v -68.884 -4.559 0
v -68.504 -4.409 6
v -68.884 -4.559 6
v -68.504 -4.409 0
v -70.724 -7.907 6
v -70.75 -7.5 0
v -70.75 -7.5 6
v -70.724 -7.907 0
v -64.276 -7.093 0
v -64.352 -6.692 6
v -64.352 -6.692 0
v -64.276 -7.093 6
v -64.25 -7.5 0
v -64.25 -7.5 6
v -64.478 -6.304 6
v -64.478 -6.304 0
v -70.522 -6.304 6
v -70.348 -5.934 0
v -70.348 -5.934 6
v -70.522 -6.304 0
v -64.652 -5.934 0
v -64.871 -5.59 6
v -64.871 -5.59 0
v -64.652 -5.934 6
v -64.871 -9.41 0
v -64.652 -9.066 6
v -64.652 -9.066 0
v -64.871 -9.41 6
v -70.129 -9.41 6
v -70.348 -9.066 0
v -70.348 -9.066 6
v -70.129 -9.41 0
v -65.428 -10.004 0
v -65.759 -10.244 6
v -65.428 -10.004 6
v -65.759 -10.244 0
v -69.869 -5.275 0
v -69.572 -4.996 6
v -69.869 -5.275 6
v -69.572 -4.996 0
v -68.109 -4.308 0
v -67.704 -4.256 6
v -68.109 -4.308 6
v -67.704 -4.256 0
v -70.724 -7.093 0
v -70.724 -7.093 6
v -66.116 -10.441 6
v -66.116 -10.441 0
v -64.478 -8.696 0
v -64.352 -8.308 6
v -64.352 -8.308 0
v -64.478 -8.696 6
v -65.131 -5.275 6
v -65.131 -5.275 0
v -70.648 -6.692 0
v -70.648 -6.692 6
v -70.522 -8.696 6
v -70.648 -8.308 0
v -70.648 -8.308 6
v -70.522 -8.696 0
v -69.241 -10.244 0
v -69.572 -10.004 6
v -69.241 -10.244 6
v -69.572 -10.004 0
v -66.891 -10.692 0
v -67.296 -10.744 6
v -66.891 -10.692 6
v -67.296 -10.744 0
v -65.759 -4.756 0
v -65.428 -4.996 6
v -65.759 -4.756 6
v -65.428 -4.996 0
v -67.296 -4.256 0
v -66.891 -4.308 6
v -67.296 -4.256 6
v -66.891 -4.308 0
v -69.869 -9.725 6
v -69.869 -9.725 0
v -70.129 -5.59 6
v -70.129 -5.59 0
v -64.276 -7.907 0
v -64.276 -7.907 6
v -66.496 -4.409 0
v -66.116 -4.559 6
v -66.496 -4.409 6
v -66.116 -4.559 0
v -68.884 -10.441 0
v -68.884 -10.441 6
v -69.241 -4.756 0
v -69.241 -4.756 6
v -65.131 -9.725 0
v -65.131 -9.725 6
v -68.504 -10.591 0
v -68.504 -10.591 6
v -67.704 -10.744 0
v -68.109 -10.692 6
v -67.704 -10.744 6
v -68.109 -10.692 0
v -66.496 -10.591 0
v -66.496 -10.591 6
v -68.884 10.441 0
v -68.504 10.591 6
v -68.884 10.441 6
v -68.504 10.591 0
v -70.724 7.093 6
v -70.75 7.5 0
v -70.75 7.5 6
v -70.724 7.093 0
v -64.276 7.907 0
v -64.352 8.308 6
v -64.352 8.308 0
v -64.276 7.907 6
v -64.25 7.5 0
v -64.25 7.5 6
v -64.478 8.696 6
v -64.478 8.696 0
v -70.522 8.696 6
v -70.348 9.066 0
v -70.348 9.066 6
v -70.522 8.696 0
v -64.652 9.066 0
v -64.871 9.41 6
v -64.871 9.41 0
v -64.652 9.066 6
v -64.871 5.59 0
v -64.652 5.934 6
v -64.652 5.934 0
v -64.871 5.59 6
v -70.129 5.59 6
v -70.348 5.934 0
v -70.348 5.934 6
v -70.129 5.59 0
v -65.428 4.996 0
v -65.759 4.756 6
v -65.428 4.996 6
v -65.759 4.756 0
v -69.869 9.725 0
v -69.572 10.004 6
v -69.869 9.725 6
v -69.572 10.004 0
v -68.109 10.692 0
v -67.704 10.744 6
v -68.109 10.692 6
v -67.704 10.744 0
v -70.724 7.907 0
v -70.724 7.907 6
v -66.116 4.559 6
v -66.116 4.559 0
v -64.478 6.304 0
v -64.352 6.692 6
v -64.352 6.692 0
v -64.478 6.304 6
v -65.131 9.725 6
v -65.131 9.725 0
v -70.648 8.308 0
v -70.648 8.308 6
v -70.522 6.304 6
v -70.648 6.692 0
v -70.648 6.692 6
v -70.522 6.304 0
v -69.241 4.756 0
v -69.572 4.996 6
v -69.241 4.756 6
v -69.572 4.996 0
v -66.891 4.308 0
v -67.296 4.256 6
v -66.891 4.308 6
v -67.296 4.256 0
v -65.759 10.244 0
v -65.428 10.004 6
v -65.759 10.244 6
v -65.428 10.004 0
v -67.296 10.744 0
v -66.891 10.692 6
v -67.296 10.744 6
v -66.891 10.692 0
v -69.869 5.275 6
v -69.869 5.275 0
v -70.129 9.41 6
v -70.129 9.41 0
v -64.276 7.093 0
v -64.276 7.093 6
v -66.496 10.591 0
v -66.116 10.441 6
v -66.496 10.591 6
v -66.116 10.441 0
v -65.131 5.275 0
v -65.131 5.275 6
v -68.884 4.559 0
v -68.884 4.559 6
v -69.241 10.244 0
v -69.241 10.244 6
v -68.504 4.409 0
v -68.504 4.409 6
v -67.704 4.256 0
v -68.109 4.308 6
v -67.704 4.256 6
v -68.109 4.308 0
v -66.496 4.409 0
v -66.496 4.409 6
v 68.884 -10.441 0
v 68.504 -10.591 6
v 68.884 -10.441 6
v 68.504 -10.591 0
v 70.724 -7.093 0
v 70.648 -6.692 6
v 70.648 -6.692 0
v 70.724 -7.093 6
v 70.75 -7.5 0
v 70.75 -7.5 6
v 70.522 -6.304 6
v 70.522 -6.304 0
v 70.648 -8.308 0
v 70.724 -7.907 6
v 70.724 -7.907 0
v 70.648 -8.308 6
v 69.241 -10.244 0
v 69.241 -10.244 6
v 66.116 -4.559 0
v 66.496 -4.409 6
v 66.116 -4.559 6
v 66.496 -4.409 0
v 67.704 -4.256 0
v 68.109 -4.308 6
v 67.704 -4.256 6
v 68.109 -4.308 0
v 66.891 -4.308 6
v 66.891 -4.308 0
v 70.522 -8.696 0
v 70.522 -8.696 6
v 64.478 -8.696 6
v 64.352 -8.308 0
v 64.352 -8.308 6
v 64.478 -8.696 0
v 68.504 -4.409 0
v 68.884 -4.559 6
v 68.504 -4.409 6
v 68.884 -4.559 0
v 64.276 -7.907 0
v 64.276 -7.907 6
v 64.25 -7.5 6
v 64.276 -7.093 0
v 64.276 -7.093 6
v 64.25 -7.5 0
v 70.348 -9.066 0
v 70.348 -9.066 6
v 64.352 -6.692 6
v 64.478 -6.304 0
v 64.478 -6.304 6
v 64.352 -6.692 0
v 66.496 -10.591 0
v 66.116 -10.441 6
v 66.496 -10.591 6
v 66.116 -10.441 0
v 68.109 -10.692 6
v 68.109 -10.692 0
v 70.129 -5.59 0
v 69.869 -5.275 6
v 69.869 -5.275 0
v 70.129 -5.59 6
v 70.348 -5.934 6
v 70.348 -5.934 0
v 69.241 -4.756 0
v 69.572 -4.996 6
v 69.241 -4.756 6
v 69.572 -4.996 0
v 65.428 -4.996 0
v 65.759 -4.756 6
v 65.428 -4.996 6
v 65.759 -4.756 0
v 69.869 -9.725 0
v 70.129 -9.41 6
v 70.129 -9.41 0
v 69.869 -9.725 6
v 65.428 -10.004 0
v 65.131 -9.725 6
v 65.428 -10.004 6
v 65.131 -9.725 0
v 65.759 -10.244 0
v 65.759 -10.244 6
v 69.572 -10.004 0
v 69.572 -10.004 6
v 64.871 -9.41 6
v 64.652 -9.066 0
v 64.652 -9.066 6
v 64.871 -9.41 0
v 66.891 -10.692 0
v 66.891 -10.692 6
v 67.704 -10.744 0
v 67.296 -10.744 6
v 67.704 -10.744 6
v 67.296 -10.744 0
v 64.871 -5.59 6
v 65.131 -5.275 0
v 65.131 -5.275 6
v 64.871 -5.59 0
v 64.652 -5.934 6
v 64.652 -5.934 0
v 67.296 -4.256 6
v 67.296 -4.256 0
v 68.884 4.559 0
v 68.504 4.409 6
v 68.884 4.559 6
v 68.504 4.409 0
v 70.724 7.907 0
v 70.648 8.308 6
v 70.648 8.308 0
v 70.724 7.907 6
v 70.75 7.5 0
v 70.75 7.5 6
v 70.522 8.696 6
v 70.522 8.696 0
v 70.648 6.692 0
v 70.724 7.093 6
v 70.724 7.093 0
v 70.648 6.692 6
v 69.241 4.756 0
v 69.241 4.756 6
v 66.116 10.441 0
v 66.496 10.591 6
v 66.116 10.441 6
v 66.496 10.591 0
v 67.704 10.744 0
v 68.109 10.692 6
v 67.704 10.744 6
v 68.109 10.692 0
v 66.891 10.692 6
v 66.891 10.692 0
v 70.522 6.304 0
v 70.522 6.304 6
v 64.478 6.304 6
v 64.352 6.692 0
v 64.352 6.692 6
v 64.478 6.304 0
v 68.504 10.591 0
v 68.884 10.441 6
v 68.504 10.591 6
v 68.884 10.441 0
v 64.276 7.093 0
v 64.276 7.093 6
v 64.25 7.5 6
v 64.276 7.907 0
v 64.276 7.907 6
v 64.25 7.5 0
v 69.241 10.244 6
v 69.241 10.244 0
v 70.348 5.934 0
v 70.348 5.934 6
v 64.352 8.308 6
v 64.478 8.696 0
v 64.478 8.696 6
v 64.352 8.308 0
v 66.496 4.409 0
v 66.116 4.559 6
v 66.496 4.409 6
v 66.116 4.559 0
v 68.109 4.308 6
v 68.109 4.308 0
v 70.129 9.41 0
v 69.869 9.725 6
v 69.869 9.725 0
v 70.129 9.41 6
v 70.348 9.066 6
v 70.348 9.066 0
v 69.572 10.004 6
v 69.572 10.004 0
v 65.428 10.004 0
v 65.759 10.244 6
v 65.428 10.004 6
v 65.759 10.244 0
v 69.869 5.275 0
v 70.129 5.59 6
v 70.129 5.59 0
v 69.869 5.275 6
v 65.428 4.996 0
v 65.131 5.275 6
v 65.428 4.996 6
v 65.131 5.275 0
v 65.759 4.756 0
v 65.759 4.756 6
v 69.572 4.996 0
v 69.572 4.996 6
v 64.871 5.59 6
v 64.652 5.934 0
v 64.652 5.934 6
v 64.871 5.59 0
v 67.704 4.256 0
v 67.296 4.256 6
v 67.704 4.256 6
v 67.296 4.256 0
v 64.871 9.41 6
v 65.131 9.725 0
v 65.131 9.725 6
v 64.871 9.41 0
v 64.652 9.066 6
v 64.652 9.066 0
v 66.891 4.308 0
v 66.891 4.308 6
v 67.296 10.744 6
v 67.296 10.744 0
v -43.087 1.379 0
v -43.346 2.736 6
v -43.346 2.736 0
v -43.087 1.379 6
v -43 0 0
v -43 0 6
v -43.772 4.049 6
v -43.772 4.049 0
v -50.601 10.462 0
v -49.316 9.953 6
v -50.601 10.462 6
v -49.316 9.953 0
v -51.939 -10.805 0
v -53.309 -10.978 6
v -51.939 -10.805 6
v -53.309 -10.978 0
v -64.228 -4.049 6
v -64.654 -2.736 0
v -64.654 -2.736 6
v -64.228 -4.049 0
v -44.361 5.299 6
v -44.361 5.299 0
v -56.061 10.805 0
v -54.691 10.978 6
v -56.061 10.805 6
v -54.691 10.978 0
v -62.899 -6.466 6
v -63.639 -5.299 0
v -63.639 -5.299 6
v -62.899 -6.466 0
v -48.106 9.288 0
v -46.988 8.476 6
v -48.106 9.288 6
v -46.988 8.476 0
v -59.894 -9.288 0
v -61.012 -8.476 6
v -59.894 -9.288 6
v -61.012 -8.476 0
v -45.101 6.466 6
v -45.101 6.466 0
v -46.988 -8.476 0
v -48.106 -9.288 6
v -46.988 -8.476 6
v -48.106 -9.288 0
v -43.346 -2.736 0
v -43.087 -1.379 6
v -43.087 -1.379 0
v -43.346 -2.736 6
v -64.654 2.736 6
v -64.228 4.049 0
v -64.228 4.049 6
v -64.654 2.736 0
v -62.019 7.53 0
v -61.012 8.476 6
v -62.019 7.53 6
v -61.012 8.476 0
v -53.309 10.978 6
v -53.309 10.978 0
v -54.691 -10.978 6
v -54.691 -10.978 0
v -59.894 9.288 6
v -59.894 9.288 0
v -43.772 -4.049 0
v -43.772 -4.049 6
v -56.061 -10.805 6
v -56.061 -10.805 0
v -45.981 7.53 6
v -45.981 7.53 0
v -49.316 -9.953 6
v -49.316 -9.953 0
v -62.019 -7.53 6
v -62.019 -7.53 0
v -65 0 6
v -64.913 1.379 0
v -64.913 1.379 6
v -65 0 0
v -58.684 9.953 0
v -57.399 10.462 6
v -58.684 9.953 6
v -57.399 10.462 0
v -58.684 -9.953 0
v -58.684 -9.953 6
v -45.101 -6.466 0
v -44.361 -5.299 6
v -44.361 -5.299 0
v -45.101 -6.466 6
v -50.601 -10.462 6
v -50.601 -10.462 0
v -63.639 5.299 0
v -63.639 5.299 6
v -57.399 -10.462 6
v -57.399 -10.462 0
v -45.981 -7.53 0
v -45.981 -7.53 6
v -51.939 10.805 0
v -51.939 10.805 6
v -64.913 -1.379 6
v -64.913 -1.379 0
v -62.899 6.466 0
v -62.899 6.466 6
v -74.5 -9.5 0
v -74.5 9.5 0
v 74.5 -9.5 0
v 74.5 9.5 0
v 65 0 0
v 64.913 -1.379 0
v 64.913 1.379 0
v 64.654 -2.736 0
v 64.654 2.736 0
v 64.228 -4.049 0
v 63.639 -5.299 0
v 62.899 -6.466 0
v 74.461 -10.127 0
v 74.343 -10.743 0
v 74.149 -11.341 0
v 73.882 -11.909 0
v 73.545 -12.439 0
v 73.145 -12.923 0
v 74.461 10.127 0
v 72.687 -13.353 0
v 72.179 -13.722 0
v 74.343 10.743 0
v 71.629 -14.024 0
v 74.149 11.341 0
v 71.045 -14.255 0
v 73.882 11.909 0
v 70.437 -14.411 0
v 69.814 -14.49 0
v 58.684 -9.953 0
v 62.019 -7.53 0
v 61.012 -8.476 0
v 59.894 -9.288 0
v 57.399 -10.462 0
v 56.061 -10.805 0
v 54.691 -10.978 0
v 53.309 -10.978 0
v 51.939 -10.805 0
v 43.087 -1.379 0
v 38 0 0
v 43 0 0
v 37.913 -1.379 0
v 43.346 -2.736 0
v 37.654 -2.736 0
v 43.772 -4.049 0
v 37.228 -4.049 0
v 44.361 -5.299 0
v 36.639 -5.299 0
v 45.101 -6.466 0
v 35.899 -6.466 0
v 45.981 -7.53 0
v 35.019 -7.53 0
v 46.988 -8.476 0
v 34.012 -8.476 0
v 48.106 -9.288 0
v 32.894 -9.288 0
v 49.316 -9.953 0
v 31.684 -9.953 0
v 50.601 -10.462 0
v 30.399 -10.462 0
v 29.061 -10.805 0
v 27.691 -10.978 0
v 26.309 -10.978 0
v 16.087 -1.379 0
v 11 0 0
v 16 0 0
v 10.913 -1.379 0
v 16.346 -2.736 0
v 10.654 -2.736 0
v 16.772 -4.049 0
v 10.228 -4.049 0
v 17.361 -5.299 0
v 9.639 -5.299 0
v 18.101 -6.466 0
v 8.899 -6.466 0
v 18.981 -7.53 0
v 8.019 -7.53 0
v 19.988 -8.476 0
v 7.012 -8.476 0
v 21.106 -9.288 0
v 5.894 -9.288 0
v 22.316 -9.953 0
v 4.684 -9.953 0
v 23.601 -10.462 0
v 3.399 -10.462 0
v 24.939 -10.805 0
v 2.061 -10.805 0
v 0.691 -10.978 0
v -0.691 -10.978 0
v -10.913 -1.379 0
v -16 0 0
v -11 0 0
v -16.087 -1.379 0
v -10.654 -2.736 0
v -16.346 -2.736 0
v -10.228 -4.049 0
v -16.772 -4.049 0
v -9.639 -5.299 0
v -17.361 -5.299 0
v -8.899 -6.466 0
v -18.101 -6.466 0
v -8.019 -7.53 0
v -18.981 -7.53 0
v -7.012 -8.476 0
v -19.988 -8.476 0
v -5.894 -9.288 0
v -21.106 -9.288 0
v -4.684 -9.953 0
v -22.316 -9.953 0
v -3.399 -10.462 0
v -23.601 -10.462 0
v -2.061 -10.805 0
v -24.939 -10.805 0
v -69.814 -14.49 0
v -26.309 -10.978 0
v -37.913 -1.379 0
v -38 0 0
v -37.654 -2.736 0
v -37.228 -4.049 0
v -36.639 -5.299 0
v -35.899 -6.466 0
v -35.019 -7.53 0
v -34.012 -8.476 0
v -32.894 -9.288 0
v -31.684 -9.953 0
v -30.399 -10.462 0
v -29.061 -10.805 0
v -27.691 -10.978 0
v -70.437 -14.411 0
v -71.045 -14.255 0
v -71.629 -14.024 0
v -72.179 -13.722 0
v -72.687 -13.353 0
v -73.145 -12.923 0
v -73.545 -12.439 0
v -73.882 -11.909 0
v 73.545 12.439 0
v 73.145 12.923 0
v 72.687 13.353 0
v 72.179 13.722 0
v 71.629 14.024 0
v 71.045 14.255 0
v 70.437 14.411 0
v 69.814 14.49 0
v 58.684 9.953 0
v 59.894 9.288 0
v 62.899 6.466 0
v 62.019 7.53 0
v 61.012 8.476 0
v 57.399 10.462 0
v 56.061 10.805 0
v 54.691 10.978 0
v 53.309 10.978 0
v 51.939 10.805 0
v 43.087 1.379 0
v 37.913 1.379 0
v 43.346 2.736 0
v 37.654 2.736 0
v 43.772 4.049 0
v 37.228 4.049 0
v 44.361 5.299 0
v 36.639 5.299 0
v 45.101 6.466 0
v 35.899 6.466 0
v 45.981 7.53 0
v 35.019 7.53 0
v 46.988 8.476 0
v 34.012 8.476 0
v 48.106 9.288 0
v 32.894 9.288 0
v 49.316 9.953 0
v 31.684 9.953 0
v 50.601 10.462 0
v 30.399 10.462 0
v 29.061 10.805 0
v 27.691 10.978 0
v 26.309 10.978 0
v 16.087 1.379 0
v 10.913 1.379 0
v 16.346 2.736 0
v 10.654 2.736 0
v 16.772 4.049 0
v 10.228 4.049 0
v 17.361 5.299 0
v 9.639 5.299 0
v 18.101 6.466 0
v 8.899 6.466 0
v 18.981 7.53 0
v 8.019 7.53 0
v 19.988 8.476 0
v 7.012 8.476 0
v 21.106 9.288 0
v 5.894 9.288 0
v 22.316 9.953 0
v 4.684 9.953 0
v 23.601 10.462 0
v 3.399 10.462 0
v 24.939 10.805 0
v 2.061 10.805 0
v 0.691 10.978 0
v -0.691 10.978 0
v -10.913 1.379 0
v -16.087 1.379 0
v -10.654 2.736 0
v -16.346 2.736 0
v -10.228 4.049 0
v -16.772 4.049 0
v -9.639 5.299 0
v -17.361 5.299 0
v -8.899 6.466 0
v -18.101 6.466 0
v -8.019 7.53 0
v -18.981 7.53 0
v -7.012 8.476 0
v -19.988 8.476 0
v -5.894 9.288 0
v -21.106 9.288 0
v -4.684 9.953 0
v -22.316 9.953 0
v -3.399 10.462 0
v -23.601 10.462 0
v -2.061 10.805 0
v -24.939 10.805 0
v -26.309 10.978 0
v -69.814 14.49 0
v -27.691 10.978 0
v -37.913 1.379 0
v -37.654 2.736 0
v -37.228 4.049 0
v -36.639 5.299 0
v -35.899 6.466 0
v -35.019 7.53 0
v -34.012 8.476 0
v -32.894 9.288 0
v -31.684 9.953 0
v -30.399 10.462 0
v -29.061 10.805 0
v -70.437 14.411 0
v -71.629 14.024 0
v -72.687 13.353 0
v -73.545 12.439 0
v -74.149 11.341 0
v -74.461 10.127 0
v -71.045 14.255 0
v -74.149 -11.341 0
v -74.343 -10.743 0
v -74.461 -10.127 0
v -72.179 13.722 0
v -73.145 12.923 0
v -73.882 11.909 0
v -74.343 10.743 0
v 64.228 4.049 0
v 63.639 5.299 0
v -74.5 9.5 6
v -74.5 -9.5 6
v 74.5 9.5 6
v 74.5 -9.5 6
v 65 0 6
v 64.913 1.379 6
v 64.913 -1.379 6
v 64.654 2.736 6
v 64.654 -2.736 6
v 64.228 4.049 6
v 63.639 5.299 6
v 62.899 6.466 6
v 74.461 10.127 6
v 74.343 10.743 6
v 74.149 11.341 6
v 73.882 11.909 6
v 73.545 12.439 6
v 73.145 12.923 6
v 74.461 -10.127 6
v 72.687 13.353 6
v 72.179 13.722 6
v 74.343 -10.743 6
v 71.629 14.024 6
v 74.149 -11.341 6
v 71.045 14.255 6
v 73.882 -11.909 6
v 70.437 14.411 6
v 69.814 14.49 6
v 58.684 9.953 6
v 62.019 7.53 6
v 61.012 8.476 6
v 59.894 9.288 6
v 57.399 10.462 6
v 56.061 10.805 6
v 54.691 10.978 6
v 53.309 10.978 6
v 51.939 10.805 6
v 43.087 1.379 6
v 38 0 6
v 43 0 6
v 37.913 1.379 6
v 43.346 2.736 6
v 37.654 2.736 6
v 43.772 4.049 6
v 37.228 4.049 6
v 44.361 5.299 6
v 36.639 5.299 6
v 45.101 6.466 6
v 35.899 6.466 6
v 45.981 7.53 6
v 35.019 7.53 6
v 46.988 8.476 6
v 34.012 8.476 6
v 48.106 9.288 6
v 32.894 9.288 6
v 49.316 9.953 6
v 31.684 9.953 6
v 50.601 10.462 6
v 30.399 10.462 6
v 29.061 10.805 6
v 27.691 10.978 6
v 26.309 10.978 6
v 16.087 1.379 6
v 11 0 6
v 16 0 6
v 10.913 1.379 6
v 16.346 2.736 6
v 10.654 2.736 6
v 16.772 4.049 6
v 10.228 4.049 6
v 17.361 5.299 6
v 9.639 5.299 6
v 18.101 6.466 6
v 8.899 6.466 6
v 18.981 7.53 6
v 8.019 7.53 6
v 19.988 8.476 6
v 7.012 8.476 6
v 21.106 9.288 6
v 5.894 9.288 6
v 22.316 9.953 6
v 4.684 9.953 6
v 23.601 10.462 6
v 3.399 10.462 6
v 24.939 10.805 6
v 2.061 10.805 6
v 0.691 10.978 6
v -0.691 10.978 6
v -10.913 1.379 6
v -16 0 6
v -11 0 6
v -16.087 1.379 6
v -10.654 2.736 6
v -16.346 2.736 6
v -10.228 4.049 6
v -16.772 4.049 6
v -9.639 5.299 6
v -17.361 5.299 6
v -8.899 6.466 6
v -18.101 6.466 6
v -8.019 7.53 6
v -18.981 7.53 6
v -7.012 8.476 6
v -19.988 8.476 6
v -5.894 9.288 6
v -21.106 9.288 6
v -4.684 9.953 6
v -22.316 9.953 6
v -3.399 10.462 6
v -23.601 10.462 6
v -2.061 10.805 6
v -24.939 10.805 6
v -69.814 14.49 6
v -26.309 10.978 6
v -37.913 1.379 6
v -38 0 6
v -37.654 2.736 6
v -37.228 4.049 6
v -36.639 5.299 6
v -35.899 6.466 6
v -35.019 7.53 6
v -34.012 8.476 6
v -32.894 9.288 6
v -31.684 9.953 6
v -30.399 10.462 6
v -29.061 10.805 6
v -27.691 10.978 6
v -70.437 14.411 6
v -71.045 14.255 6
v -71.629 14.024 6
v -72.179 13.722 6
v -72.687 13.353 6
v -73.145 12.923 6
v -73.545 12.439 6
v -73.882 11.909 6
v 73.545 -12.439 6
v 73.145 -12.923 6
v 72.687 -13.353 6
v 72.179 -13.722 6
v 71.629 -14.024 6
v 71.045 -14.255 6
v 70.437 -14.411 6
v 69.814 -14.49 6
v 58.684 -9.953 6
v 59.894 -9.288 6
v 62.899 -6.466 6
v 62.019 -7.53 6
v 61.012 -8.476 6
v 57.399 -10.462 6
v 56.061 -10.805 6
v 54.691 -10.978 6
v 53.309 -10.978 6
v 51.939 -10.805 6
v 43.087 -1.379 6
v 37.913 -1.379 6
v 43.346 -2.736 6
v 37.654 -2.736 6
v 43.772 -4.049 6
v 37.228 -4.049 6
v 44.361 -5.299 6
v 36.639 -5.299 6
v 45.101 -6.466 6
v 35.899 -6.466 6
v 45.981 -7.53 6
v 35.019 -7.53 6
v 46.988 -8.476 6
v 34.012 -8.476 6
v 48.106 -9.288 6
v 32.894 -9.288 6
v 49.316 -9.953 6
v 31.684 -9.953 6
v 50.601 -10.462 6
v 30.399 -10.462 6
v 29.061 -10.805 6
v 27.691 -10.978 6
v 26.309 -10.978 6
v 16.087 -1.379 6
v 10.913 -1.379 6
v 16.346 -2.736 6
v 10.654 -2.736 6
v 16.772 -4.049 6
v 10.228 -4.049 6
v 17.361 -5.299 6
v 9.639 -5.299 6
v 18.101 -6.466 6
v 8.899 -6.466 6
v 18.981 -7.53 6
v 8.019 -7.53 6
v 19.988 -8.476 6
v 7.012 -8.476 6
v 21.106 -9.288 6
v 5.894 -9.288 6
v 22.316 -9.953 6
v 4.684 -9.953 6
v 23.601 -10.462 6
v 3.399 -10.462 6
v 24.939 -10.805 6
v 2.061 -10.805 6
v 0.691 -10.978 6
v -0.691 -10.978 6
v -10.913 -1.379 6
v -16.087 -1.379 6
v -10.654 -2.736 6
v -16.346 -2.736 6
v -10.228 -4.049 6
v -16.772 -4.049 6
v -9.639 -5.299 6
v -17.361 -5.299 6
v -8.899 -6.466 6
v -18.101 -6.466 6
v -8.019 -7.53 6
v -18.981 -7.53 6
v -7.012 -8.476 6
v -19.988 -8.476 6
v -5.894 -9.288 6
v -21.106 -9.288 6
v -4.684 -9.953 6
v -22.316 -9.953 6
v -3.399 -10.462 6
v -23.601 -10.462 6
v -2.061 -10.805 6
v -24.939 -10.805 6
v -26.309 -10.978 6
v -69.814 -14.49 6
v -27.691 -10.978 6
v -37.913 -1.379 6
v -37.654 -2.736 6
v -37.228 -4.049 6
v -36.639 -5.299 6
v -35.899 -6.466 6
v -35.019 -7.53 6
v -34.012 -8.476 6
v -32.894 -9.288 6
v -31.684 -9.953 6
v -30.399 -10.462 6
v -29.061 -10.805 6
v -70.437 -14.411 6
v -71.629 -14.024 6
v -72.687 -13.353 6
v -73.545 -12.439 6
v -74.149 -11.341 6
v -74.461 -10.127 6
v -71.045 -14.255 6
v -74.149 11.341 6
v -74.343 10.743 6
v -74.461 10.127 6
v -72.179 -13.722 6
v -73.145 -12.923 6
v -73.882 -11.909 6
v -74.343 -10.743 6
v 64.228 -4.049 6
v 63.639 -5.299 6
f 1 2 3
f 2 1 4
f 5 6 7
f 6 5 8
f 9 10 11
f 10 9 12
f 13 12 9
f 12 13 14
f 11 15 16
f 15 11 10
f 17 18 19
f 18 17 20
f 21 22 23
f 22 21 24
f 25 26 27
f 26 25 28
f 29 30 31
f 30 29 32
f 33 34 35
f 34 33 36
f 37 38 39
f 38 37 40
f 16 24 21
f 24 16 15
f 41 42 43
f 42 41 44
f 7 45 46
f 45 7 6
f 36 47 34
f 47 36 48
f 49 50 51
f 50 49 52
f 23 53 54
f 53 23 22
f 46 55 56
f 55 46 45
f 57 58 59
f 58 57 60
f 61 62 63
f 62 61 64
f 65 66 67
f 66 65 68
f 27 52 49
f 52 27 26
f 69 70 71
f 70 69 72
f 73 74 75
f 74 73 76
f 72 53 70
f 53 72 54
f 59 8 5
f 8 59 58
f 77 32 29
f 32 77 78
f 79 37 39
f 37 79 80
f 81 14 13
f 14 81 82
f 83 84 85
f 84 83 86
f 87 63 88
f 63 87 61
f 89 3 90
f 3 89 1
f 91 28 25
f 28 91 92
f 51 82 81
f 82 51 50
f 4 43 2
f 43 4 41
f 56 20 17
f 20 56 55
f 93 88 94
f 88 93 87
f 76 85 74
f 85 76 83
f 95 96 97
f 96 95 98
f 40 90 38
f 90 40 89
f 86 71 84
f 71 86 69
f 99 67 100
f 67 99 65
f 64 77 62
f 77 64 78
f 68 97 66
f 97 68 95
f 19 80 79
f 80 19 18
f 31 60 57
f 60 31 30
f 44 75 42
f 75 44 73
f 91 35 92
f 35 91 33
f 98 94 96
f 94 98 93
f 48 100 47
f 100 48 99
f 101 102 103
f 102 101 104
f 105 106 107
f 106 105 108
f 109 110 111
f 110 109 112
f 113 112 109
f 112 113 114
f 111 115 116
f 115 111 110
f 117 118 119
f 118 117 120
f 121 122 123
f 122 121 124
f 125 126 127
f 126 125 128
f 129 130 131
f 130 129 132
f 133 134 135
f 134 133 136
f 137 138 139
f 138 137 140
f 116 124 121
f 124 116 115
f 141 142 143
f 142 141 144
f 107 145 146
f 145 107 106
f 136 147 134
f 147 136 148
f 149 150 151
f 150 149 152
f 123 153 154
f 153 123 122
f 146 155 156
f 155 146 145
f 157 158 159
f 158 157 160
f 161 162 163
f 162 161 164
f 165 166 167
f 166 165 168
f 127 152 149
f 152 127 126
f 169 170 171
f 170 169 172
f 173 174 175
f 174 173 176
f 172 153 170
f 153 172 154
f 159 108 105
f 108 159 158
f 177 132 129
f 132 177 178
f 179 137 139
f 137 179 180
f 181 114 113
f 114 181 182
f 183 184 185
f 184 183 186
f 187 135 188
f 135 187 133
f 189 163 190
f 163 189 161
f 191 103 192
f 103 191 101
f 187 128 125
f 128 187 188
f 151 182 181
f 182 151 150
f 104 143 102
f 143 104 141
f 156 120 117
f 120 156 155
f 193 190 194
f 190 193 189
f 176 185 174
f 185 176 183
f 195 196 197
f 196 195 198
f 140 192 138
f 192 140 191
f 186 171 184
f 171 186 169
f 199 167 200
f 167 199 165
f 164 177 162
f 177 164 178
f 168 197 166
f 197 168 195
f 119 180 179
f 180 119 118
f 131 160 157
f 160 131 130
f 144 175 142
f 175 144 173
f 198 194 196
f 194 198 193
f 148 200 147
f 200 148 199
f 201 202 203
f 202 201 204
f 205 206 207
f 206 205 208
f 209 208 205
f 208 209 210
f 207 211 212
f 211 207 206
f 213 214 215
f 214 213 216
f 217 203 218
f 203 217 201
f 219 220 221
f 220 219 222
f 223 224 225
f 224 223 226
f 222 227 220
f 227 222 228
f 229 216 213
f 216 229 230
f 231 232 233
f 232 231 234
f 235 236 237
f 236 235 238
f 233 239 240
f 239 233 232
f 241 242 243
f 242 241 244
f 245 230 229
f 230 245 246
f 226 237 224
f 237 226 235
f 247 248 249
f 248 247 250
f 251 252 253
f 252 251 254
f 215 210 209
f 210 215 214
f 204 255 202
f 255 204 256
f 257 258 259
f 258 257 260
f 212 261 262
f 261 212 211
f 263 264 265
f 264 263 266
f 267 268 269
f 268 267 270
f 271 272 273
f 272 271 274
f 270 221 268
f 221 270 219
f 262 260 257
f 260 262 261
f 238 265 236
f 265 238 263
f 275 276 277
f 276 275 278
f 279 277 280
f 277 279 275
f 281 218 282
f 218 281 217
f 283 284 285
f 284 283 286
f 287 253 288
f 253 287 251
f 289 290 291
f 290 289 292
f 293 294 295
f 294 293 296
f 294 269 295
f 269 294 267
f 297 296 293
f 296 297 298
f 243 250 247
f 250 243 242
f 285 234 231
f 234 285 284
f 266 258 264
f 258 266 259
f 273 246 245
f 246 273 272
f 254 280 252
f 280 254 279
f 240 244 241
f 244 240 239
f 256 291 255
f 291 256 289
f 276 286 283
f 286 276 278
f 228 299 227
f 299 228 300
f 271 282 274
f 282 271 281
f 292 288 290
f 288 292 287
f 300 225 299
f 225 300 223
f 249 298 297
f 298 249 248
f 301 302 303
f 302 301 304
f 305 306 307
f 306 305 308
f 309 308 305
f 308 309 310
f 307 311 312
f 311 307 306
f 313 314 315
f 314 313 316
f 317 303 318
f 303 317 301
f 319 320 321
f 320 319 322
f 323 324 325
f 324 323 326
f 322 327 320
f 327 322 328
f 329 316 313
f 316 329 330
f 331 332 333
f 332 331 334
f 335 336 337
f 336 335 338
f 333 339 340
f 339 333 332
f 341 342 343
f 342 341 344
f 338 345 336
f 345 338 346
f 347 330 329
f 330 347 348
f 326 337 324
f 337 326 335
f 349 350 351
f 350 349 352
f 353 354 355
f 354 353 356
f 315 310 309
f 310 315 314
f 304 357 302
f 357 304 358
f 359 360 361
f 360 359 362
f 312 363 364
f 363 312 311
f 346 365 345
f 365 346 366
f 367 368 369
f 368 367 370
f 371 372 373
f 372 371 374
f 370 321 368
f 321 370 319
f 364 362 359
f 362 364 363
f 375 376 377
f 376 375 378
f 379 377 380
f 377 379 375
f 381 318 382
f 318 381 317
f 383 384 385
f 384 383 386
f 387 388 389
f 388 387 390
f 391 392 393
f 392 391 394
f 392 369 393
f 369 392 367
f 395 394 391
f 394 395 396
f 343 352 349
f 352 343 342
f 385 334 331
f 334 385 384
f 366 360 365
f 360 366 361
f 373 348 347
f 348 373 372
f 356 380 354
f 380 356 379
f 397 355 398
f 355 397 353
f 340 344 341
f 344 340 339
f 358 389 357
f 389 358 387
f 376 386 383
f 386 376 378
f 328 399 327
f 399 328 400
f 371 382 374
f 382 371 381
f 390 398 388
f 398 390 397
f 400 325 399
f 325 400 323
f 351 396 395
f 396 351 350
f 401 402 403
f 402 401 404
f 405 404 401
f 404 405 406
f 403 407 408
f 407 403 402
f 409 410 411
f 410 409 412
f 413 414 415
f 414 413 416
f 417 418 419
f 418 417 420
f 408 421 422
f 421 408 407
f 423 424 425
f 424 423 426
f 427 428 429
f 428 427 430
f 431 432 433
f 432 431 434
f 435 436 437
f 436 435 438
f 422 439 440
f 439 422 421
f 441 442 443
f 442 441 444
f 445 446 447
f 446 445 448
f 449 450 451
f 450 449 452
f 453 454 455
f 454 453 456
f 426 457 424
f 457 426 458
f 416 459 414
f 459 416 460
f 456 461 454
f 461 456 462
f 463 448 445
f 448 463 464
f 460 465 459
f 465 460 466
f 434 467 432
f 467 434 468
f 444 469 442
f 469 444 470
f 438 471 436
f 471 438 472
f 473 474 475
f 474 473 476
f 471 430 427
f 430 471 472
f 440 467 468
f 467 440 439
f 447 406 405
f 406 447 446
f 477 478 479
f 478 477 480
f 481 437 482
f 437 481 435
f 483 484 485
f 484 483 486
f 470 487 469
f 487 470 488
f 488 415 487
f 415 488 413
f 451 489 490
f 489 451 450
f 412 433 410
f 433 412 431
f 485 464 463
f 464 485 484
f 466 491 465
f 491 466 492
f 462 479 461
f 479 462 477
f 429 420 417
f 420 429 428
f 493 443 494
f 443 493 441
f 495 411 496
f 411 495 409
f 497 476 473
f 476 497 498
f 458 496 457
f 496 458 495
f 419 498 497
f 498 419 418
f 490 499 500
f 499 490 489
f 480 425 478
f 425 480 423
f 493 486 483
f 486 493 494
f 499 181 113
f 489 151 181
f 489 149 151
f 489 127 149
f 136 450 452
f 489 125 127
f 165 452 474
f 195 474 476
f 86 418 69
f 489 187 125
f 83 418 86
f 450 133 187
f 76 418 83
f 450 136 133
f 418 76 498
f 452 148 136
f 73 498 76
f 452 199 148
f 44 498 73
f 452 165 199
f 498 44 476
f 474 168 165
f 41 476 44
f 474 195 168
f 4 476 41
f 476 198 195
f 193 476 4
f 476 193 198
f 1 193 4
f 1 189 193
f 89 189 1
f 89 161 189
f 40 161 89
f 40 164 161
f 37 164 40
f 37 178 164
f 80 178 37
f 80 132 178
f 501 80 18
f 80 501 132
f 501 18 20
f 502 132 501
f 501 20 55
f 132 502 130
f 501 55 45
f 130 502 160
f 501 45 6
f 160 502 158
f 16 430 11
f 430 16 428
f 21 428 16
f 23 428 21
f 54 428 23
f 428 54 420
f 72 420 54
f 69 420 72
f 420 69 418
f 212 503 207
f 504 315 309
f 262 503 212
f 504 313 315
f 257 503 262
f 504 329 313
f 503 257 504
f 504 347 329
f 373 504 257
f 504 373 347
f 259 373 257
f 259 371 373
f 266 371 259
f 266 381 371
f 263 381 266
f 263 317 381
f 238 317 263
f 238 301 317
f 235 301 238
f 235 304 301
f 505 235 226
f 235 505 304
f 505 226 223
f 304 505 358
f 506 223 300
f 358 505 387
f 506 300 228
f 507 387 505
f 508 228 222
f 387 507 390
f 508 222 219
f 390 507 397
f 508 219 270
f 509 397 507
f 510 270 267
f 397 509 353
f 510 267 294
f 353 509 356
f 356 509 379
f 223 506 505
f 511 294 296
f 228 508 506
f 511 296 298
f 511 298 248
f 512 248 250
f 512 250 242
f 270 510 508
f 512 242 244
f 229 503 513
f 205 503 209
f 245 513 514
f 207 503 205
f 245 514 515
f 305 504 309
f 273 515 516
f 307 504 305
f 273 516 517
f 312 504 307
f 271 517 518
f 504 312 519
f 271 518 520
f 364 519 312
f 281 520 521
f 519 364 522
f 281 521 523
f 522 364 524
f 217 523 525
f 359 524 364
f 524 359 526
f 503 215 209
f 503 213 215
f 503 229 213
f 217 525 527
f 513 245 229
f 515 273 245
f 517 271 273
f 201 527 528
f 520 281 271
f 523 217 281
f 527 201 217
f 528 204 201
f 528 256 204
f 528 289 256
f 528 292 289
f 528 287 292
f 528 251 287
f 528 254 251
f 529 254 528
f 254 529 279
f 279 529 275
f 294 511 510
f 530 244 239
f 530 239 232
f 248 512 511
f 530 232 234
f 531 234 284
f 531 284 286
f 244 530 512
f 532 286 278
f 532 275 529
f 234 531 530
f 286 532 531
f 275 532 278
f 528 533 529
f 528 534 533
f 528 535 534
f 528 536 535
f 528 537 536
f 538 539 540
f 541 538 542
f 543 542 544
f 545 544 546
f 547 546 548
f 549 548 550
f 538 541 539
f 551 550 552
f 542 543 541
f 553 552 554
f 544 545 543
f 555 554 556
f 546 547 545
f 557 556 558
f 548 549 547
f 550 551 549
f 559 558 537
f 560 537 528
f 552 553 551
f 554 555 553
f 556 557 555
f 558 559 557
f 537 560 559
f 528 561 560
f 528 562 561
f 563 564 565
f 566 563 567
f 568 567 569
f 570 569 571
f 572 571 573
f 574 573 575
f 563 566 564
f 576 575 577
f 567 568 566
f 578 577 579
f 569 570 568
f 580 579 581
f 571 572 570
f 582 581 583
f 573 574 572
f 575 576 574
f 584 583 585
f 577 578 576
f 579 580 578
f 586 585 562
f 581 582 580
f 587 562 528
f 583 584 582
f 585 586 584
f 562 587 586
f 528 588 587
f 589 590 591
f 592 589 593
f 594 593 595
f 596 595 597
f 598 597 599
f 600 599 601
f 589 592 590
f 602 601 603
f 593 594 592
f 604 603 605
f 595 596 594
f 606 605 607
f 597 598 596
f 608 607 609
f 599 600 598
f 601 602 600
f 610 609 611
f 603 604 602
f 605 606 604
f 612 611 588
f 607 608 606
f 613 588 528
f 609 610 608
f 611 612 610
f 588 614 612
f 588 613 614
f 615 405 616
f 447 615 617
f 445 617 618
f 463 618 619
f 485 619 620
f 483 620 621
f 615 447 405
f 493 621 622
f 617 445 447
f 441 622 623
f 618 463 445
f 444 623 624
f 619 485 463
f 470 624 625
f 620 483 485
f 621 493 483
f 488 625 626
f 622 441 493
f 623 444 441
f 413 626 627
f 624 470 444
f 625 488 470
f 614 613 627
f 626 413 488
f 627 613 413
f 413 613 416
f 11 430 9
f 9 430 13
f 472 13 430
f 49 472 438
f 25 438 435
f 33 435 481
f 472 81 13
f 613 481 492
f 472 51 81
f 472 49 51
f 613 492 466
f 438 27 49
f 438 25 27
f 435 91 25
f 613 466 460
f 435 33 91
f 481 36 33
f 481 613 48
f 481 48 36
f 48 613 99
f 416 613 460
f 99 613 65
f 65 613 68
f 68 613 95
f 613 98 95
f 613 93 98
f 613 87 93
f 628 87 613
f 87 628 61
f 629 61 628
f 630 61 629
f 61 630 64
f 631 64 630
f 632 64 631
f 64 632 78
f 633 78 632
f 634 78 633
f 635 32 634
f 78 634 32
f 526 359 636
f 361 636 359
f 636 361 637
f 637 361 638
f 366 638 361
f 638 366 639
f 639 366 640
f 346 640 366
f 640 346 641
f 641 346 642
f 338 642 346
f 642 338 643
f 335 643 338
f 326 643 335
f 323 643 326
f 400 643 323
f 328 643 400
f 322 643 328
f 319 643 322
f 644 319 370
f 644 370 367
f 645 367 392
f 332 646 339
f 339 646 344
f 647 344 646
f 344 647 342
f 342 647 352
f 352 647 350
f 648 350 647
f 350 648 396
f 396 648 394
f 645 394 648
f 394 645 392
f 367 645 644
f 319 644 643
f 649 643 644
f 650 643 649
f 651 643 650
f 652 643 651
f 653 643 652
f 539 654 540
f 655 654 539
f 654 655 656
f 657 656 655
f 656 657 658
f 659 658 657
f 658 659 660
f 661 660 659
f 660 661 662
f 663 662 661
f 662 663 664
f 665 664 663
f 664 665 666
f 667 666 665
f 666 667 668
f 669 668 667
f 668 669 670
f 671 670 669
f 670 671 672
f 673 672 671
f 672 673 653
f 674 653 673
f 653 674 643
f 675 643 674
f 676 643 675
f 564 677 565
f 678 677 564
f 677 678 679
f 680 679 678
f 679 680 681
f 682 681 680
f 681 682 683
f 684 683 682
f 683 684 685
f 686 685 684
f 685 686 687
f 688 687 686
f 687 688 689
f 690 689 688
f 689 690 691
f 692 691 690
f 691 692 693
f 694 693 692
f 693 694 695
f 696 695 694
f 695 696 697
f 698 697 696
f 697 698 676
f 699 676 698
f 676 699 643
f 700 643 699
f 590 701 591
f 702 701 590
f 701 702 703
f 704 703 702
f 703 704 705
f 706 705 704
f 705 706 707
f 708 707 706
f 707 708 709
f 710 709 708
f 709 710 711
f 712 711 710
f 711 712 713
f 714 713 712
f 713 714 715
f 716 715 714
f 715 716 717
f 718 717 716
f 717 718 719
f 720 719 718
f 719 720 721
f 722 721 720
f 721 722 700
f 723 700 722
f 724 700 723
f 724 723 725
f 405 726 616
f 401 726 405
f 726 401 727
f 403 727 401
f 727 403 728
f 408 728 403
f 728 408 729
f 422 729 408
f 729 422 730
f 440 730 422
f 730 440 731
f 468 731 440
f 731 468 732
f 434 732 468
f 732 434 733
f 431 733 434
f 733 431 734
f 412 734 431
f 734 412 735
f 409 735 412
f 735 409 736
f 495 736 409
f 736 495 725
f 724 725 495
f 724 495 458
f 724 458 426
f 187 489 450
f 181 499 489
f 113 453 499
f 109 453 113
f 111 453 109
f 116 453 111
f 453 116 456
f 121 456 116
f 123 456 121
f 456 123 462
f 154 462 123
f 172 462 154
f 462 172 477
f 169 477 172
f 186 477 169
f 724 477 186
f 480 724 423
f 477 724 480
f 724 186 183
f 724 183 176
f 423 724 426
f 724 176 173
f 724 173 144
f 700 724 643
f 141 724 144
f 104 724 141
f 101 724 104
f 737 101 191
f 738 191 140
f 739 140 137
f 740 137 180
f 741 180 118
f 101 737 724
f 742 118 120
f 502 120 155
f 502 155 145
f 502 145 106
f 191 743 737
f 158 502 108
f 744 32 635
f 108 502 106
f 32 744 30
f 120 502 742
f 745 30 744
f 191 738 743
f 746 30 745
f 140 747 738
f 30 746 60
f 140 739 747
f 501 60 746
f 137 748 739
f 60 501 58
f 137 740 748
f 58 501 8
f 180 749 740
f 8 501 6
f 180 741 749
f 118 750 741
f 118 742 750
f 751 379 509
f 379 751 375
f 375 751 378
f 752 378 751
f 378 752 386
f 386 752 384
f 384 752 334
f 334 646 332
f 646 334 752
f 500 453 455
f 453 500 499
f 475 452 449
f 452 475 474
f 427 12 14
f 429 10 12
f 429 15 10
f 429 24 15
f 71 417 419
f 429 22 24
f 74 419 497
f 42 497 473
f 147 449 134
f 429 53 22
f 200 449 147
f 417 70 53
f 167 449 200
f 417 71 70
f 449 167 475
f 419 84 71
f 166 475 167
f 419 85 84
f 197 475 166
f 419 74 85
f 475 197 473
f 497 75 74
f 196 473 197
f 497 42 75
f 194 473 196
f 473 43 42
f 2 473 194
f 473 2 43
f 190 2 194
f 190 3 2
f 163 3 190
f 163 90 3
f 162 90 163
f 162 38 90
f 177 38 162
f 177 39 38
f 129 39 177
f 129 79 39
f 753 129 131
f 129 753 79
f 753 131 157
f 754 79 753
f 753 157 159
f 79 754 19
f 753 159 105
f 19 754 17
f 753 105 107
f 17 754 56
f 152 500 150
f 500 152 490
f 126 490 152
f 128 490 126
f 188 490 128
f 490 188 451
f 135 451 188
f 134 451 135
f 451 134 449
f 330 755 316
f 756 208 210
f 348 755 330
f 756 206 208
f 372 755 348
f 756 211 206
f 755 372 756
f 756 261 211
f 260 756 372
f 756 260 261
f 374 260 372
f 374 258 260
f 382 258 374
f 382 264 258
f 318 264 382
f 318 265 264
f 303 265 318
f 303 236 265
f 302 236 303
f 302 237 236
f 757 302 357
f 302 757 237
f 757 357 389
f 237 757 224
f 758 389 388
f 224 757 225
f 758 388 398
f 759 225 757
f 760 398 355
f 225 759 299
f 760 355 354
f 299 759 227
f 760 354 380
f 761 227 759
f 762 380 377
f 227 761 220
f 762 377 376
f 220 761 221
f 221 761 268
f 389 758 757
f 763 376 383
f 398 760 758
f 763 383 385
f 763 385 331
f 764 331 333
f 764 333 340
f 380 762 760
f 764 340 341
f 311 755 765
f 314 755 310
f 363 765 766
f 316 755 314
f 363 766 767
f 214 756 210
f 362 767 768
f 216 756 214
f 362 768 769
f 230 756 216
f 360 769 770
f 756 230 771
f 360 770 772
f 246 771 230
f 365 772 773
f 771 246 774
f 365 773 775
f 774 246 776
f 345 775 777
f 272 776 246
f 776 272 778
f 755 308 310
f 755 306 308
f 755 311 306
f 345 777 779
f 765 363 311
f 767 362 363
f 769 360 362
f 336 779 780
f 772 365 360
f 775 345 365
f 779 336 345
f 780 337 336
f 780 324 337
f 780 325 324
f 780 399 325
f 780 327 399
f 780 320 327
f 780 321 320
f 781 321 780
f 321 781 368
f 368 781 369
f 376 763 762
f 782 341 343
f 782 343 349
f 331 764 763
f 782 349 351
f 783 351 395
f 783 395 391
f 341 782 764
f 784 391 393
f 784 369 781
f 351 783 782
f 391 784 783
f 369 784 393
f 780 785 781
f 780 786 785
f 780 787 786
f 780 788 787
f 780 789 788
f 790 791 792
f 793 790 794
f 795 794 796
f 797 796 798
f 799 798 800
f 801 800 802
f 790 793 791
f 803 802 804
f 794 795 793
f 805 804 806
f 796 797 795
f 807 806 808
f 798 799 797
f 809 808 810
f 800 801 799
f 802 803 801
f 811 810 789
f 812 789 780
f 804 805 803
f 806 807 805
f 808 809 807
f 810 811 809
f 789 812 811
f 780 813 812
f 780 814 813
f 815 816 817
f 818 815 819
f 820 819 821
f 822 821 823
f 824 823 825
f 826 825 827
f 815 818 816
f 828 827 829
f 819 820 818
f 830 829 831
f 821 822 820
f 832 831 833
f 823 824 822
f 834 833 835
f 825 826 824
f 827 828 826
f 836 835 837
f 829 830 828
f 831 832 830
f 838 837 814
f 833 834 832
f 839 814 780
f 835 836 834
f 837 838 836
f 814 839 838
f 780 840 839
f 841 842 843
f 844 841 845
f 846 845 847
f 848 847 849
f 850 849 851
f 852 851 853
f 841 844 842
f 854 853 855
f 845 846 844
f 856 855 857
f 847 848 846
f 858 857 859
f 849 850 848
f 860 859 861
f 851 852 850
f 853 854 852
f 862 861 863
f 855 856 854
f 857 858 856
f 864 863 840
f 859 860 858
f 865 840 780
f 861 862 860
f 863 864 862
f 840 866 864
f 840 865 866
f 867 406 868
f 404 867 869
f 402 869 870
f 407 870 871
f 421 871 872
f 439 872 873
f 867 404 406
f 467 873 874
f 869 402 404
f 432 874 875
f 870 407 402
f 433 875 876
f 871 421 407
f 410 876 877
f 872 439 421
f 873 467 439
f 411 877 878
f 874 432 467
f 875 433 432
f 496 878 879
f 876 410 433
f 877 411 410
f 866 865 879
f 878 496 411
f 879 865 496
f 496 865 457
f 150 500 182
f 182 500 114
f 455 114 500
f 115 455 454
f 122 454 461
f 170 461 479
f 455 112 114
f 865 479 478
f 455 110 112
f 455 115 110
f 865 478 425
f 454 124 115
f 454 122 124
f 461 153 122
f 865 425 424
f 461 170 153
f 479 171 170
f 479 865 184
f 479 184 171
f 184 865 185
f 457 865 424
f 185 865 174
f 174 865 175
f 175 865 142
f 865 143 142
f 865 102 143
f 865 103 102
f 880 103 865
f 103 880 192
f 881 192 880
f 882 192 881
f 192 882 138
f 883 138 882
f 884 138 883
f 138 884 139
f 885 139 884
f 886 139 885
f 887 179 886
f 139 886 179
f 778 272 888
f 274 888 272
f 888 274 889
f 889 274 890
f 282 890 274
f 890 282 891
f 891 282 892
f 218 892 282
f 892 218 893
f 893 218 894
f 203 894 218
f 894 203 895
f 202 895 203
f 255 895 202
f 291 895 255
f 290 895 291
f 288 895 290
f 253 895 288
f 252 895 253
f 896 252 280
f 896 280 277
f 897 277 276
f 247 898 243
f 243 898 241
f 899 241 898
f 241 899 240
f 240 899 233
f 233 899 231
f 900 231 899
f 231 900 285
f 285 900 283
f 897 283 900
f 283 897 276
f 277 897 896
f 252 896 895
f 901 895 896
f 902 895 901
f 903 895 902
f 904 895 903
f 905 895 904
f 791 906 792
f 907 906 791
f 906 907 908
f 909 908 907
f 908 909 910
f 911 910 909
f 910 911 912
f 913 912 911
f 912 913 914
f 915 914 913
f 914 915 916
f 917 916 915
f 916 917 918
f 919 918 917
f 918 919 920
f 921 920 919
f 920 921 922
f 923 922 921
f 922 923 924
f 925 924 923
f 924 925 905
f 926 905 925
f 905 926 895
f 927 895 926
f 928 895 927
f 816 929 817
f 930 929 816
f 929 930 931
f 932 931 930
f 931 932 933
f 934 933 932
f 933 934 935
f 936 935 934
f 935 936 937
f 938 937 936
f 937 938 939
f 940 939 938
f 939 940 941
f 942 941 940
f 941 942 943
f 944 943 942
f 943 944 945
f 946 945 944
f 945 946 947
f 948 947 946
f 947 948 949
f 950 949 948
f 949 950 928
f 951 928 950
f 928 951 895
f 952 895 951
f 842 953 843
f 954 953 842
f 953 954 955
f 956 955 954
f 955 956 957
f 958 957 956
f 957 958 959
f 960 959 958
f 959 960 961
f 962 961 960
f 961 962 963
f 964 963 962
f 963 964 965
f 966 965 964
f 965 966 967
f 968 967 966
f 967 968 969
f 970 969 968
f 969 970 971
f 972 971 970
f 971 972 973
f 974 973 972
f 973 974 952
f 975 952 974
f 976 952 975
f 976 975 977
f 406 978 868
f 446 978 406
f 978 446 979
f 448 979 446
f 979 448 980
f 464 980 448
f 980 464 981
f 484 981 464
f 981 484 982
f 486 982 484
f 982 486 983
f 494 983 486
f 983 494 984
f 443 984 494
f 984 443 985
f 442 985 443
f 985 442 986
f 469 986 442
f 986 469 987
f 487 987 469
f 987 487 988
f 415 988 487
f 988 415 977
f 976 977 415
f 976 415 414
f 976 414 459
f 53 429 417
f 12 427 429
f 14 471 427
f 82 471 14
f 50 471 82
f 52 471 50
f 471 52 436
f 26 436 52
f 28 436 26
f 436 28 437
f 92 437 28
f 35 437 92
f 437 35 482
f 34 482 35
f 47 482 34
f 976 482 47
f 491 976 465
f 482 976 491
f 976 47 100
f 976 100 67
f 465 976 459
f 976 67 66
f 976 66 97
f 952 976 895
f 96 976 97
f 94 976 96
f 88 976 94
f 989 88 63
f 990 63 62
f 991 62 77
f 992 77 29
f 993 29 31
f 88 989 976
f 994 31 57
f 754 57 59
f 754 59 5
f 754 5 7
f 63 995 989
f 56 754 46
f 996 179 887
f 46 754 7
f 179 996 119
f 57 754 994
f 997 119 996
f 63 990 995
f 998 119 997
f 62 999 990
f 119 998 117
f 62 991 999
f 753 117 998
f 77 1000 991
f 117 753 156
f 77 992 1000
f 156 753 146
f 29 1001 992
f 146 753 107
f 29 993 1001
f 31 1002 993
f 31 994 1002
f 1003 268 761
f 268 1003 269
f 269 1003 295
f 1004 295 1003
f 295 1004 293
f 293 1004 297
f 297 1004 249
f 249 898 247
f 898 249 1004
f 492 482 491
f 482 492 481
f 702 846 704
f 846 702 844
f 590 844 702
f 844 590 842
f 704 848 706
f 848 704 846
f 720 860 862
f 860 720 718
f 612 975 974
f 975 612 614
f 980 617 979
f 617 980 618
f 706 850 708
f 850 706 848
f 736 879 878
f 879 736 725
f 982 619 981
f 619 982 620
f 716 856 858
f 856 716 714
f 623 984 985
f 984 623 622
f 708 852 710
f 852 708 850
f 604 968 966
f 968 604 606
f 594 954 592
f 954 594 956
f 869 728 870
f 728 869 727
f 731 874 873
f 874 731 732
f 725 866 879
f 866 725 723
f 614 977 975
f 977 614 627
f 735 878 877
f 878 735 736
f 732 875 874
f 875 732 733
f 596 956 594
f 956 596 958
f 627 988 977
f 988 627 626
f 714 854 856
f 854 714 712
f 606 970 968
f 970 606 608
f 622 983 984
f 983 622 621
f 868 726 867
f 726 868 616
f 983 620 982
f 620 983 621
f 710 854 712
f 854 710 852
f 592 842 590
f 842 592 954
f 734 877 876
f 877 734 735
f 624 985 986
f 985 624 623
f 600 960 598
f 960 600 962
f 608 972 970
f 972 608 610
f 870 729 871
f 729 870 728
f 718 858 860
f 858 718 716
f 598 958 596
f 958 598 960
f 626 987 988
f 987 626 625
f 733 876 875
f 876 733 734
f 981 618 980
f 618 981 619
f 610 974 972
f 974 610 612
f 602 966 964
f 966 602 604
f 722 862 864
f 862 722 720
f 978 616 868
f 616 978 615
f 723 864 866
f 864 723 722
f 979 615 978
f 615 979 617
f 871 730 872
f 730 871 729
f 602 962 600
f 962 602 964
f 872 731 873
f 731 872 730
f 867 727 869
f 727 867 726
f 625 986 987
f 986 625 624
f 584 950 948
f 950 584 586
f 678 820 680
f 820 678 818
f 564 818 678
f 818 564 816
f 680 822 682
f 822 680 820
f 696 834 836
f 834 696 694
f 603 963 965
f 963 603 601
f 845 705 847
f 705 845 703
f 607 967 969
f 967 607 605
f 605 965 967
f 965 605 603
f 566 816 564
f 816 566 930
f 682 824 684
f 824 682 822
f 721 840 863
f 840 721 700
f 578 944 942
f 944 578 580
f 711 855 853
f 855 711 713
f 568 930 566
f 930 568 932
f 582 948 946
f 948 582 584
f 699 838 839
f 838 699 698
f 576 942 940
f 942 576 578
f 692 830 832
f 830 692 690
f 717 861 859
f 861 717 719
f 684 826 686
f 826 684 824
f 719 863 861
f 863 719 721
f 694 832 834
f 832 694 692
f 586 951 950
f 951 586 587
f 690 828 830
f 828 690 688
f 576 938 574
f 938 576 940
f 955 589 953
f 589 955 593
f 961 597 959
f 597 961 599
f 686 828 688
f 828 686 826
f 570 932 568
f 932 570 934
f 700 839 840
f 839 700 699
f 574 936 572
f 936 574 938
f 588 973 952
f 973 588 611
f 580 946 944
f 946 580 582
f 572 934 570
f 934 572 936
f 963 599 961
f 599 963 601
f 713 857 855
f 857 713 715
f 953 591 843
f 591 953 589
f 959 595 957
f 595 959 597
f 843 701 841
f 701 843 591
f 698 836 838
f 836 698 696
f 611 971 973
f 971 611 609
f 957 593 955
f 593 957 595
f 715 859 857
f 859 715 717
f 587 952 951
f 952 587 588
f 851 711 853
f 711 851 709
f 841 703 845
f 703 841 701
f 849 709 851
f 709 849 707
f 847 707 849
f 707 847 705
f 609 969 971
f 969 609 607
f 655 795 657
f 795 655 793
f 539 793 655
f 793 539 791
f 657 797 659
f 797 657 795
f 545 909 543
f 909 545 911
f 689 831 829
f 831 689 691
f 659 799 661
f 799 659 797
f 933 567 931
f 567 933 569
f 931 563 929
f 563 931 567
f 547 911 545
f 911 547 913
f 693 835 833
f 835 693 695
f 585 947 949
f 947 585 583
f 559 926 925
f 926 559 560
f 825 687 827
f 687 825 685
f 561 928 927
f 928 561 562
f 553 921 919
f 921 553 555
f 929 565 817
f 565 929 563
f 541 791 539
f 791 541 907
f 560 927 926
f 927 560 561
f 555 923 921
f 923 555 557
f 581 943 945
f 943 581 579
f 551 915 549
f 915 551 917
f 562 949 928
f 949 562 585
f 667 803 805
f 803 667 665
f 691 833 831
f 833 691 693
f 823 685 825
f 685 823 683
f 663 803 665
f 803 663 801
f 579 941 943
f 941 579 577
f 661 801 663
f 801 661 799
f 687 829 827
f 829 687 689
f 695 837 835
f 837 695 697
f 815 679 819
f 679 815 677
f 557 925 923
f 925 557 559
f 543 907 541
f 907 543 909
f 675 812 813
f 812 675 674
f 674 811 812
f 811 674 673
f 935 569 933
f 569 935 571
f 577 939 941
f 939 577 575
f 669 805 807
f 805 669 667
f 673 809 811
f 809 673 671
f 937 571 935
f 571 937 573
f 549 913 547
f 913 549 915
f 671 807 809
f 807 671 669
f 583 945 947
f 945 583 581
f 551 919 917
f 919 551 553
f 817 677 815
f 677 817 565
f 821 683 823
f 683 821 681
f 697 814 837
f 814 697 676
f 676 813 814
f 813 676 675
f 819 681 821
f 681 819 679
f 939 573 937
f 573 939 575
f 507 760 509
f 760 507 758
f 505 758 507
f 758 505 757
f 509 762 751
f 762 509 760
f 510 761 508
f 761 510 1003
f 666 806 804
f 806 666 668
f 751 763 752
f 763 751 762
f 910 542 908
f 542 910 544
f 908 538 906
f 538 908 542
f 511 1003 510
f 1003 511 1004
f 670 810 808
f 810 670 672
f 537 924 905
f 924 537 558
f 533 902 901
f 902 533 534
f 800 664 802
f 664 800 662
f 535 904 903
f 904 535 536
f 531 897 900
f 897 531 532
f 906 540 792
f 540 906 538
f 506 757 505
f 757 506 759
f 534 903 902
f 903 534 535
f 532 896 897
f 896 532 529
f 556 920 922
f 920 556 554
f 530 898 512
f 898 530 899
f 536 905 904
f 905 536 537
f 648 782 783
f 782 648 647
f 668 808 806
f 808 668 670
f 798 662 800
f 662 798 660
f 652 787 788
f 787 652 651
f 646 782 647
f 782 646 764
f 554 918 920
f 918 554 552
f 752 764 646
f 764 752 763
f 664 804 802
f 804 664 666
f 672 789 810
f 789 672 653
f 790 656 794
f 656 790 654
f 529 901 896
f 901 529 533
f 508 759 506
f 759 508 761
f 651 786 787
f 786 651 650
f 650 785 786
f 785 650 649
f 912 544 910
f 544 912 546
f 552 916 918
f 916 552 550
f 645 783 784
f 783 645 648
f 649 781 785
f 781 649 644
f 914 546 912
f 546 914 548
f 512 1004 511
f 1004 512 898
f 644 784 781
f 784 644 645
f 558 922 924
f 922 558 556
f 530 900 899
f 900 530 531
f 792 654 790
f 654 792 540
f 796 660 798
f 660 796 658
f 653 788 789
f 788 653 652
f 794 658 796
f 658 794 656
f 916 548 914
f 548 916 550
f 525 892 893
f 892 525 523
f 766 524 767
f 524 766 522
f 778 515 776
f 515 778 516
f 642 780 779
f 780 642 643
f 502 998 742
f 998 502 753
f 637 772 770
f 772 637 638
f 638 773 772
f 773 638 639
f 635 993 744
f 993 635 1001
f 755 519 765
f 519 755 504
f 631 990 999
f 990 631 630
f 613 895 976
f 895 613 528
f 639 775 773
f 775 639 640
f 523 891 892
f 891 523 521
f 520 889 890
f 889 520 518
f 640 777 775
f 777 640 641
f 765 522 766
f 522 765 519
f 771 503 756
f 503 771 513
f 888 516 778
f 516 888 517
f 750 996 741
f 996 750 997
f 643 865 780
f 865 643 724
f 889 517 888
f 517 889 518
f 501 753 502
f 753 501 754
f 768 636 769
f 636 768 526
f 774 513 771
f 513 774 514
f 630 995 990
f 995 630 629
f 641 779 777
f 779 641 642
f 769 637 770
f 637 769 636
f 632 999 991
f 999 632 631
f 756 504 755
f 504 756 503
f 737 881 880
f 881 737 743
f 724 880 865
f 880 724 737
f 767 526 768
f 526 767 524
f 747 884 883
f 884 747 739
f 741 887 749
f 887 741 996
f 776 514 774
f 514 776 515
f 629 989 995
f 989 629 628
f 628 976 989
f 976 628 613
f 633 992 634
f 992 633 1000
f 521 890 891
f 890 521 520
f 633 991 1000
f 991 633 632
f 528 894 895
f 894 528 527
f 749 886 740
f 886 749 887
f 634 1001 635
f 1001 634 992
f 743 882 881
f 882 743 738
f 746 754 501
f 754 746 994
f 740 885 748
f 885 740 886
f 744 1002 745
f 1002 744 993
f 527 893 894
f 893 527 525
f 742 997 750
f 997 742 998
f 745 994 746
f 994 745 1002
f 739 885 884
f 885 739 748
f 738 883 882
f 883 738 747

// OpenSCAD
$fn = 50;


difference() {
	union() {
		hull() {
			translate(v = [-69.5000000000, 9.5000000000, 0]) {
				cylinder(h = 6, r = 5);
			}
			translate(v = [69.5000000000, 9.5000000000, 0]) {
				cylinder(h = 6, r = 5);
			}
			translate(v = [-69.5000000000, -9.5000000000, 0]) {
				cylinder(h = 6, r = 5);
			}
			translate(v = [69.5000000000, -9.5000000000, 0]) {
				cylinder(h = 6, r = 5);
			}
		}
	}
	union() {
		#translate(v = [-67.5000000000, -7.5000000000, -100.0000000000]) {
			cylinder(h = 200, r = 3.2500000000);
		}
		#translate(v = [-67.5000000000, 7.5000000000, -100.0000000000]) {
			cylinder(h = 200, r = 3.2500000000);
		}
		#translate(v = [67.5000000000, -7.5000000000, -100.0000000000]) {
			cylinder(h = 200, r = 3.2500000000);
		}
		#translate(v = [67.5000000000, 7.5000000000, -100.0000000000]) {
			cylinder(h = 200, r = 3.2500000000);
		}
		#translate(v = [-54.0000000000, 0, 0]) {
			cylinder(h = 6, r = 11.0000000000);
		}
		#translate(v = [-27.0000000000, 0, 0]) {
			cylinder(h = 6, r = 11.0000000000);
		}
		#cylinder(h = 6, r = 11.0000000000);
		#translate(v = [27.0000000000, 0, 0]) {
			cylinder(h = 6, r = 11.0000000000);
		}
		#translate(v = [54.0000000000, 0, 0]) {
			cylinder(h = 6, r = 11.0000000000);
		}
	}
}
